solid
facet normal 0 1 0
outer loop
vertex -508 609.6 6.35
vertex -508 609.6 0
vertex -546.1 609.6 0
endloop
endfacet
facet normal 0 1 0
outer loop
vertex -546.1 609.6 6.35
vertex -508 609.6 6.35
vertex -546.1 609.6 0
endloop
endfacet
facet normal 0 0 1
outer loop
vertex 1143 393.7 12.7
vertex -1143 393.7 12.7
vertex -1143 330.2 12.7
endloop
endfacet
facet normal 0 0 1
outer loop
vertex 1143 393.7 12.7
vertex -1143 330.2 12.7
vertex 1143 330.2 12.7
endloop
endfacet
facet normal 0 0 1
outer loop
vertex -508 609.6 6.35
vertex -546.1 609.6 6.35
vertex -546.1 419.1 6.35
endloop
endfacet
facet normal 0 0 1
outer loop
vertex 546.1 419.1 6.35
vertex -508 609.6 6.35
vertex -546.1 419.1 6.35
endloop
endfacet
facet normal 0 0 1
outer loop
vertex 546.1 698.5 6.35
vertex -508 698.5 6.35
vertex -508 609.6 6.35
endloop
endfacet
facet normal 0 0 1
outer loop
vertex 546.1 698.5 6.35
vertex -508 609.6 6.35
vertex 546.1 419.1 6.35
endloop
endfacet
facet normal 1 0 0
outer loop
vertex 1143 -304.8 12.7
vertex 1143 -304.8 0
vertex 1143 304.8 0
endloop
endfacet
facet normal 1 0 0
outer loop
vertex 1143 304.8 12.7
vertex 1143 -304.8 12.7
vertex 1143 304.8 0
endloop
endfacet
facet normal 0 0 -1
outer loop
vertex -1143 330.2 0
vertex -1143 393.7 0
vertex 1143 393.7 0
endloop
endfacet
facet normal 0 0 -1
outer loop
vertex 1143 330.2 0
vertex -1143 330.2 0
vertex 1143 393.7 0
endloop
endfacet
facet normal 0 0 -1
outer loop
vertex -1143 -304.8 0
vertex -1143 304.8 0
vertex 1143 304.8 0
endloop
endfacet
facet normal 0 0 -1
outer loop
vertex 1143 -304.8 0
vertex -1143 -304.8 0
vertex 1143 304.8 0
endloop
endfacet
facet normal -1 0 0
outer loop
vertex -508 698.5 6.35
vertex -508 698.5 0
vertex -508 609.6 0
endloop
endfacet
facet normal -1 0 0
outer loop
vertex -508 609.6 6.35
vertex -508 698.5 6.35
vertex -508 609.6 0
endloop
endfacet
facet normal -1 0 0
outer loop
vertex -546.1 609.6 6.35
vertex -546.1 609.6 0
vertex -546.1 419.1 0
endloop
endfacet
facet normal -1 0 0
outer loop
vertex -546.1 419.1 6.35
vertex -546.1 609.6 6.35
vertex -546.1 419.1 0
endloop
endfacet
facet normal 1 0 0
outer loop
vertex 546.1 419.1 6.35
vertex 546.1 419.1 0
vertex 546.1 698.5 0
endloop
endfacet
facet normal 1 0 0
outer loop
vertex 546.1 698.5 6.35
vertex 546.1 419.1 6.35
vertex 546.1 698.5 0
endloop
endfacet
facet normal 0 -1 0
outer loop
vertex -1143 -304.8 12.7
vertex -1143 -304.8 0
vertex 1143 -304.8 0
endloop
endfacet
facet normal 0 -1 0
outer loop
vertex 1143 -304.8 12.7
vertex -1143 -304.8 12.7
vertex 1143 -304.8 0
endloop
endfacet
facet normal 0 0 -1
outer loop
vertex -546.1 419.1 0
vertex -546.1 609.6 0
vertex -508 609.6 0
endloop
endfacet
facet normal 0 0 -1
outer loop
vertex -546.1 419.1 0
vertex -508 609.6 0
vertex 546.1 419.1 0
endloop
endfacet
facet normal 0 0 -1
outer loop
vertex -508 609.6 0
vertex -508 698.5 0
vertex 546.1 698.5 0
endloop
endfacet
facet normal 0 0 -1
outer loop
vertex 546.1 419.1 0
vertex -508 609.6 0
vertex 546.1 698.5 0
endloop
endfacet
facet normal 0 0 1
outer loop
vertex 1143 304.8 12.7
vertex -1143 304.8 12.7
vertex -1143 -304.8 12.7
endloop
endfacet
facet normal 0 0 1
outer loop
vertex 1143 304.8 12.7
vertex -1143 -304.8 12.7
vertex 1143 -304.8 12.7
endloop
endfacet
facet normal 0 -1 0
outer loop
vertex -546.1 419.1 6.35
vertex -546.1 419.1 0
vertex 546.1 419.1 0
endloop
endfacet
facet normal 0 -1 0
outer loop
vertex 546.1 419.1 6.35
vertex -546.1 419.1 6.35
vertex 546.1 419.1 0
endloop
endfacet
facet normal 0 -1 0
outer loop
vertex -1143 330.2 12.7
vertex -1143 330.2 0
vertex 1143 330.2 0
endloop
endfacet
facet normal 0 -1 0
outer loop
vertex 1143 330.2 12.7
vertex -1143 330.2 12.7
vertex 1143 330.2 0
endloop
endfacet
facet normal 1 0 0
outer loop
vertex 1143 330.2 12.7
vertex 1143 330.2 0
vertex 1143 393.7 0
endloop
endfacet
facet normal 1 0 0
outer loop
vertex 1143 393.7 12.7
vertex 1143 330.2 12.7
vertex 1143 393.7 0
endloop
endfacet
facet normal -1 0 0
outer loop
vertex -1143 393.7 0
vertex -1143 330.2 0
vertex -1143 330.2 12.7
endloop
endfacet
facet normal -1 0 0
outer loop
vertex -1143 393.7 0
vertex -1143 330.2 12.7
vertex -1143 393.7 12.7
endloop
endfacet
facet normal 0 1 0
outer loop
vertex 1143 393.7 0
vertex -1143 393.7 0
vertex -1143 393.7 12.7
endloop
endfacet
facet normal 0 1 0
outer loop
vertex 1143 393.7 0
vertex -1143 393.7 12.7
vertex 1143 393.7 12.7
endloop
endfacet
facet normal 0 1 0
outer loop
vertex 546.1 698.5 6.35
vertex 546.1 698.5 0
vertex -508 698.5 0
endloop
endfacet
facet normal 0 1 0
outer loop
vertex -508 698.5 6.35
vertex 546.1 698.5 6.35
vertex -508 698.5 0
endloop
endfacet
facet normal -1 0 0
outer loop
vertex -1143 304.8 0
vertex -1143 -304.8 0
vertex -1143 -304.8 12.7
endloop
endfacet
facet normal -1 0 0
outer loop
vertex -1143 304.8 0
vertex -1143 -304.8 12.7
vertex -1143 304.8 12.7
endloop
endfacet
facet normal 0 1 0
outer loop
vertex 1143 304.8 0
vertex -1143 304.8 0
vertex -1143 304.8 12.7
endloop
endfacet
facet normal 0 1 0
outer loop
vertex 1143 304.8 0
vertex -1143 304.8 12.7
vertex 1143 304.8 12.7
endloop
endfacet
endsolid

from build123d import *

# Parameters (mm, degrees)
F0_W     = 2286
F0_H     = 609.6
F1_DEPTH = 12.7
F2_W     = 2286
F2_H     = 63.5
F3_DEPTH = 12.7
F5_DEPTH = 6.35


with BuildPart() as f1:
    # F0 (on Top) → F1 (new body)
    with BuildSketch(Plane.XY):
        Rectangle(F0_W, F0_H)
    extrude(amount=F1_DEPTH)


with BuildPart() as f3:
    # F2 (on Top) → F3 (new body, through all)
    with BuildSketch(Plane.XY):
        with Locations((0, 361.95)):
            Rectangle(F2_W, F2_H)
    extrude(amount=F3_DEPTH)


with BuildPart() as f5:
    # F4 (on Top) → F5 (new body)
    with BuildSketch(Plane.XY):
        Polygon((546.1, 419.1), (546.1, 698.5), (-508, 698.5), (-508, 609.6), (-546.1, 609.6), (-546.1, 419.1), align=None)
    extrude(amount=F5_DEPTH)


solid = Compound([f1.part, f3.part, f5.part])
